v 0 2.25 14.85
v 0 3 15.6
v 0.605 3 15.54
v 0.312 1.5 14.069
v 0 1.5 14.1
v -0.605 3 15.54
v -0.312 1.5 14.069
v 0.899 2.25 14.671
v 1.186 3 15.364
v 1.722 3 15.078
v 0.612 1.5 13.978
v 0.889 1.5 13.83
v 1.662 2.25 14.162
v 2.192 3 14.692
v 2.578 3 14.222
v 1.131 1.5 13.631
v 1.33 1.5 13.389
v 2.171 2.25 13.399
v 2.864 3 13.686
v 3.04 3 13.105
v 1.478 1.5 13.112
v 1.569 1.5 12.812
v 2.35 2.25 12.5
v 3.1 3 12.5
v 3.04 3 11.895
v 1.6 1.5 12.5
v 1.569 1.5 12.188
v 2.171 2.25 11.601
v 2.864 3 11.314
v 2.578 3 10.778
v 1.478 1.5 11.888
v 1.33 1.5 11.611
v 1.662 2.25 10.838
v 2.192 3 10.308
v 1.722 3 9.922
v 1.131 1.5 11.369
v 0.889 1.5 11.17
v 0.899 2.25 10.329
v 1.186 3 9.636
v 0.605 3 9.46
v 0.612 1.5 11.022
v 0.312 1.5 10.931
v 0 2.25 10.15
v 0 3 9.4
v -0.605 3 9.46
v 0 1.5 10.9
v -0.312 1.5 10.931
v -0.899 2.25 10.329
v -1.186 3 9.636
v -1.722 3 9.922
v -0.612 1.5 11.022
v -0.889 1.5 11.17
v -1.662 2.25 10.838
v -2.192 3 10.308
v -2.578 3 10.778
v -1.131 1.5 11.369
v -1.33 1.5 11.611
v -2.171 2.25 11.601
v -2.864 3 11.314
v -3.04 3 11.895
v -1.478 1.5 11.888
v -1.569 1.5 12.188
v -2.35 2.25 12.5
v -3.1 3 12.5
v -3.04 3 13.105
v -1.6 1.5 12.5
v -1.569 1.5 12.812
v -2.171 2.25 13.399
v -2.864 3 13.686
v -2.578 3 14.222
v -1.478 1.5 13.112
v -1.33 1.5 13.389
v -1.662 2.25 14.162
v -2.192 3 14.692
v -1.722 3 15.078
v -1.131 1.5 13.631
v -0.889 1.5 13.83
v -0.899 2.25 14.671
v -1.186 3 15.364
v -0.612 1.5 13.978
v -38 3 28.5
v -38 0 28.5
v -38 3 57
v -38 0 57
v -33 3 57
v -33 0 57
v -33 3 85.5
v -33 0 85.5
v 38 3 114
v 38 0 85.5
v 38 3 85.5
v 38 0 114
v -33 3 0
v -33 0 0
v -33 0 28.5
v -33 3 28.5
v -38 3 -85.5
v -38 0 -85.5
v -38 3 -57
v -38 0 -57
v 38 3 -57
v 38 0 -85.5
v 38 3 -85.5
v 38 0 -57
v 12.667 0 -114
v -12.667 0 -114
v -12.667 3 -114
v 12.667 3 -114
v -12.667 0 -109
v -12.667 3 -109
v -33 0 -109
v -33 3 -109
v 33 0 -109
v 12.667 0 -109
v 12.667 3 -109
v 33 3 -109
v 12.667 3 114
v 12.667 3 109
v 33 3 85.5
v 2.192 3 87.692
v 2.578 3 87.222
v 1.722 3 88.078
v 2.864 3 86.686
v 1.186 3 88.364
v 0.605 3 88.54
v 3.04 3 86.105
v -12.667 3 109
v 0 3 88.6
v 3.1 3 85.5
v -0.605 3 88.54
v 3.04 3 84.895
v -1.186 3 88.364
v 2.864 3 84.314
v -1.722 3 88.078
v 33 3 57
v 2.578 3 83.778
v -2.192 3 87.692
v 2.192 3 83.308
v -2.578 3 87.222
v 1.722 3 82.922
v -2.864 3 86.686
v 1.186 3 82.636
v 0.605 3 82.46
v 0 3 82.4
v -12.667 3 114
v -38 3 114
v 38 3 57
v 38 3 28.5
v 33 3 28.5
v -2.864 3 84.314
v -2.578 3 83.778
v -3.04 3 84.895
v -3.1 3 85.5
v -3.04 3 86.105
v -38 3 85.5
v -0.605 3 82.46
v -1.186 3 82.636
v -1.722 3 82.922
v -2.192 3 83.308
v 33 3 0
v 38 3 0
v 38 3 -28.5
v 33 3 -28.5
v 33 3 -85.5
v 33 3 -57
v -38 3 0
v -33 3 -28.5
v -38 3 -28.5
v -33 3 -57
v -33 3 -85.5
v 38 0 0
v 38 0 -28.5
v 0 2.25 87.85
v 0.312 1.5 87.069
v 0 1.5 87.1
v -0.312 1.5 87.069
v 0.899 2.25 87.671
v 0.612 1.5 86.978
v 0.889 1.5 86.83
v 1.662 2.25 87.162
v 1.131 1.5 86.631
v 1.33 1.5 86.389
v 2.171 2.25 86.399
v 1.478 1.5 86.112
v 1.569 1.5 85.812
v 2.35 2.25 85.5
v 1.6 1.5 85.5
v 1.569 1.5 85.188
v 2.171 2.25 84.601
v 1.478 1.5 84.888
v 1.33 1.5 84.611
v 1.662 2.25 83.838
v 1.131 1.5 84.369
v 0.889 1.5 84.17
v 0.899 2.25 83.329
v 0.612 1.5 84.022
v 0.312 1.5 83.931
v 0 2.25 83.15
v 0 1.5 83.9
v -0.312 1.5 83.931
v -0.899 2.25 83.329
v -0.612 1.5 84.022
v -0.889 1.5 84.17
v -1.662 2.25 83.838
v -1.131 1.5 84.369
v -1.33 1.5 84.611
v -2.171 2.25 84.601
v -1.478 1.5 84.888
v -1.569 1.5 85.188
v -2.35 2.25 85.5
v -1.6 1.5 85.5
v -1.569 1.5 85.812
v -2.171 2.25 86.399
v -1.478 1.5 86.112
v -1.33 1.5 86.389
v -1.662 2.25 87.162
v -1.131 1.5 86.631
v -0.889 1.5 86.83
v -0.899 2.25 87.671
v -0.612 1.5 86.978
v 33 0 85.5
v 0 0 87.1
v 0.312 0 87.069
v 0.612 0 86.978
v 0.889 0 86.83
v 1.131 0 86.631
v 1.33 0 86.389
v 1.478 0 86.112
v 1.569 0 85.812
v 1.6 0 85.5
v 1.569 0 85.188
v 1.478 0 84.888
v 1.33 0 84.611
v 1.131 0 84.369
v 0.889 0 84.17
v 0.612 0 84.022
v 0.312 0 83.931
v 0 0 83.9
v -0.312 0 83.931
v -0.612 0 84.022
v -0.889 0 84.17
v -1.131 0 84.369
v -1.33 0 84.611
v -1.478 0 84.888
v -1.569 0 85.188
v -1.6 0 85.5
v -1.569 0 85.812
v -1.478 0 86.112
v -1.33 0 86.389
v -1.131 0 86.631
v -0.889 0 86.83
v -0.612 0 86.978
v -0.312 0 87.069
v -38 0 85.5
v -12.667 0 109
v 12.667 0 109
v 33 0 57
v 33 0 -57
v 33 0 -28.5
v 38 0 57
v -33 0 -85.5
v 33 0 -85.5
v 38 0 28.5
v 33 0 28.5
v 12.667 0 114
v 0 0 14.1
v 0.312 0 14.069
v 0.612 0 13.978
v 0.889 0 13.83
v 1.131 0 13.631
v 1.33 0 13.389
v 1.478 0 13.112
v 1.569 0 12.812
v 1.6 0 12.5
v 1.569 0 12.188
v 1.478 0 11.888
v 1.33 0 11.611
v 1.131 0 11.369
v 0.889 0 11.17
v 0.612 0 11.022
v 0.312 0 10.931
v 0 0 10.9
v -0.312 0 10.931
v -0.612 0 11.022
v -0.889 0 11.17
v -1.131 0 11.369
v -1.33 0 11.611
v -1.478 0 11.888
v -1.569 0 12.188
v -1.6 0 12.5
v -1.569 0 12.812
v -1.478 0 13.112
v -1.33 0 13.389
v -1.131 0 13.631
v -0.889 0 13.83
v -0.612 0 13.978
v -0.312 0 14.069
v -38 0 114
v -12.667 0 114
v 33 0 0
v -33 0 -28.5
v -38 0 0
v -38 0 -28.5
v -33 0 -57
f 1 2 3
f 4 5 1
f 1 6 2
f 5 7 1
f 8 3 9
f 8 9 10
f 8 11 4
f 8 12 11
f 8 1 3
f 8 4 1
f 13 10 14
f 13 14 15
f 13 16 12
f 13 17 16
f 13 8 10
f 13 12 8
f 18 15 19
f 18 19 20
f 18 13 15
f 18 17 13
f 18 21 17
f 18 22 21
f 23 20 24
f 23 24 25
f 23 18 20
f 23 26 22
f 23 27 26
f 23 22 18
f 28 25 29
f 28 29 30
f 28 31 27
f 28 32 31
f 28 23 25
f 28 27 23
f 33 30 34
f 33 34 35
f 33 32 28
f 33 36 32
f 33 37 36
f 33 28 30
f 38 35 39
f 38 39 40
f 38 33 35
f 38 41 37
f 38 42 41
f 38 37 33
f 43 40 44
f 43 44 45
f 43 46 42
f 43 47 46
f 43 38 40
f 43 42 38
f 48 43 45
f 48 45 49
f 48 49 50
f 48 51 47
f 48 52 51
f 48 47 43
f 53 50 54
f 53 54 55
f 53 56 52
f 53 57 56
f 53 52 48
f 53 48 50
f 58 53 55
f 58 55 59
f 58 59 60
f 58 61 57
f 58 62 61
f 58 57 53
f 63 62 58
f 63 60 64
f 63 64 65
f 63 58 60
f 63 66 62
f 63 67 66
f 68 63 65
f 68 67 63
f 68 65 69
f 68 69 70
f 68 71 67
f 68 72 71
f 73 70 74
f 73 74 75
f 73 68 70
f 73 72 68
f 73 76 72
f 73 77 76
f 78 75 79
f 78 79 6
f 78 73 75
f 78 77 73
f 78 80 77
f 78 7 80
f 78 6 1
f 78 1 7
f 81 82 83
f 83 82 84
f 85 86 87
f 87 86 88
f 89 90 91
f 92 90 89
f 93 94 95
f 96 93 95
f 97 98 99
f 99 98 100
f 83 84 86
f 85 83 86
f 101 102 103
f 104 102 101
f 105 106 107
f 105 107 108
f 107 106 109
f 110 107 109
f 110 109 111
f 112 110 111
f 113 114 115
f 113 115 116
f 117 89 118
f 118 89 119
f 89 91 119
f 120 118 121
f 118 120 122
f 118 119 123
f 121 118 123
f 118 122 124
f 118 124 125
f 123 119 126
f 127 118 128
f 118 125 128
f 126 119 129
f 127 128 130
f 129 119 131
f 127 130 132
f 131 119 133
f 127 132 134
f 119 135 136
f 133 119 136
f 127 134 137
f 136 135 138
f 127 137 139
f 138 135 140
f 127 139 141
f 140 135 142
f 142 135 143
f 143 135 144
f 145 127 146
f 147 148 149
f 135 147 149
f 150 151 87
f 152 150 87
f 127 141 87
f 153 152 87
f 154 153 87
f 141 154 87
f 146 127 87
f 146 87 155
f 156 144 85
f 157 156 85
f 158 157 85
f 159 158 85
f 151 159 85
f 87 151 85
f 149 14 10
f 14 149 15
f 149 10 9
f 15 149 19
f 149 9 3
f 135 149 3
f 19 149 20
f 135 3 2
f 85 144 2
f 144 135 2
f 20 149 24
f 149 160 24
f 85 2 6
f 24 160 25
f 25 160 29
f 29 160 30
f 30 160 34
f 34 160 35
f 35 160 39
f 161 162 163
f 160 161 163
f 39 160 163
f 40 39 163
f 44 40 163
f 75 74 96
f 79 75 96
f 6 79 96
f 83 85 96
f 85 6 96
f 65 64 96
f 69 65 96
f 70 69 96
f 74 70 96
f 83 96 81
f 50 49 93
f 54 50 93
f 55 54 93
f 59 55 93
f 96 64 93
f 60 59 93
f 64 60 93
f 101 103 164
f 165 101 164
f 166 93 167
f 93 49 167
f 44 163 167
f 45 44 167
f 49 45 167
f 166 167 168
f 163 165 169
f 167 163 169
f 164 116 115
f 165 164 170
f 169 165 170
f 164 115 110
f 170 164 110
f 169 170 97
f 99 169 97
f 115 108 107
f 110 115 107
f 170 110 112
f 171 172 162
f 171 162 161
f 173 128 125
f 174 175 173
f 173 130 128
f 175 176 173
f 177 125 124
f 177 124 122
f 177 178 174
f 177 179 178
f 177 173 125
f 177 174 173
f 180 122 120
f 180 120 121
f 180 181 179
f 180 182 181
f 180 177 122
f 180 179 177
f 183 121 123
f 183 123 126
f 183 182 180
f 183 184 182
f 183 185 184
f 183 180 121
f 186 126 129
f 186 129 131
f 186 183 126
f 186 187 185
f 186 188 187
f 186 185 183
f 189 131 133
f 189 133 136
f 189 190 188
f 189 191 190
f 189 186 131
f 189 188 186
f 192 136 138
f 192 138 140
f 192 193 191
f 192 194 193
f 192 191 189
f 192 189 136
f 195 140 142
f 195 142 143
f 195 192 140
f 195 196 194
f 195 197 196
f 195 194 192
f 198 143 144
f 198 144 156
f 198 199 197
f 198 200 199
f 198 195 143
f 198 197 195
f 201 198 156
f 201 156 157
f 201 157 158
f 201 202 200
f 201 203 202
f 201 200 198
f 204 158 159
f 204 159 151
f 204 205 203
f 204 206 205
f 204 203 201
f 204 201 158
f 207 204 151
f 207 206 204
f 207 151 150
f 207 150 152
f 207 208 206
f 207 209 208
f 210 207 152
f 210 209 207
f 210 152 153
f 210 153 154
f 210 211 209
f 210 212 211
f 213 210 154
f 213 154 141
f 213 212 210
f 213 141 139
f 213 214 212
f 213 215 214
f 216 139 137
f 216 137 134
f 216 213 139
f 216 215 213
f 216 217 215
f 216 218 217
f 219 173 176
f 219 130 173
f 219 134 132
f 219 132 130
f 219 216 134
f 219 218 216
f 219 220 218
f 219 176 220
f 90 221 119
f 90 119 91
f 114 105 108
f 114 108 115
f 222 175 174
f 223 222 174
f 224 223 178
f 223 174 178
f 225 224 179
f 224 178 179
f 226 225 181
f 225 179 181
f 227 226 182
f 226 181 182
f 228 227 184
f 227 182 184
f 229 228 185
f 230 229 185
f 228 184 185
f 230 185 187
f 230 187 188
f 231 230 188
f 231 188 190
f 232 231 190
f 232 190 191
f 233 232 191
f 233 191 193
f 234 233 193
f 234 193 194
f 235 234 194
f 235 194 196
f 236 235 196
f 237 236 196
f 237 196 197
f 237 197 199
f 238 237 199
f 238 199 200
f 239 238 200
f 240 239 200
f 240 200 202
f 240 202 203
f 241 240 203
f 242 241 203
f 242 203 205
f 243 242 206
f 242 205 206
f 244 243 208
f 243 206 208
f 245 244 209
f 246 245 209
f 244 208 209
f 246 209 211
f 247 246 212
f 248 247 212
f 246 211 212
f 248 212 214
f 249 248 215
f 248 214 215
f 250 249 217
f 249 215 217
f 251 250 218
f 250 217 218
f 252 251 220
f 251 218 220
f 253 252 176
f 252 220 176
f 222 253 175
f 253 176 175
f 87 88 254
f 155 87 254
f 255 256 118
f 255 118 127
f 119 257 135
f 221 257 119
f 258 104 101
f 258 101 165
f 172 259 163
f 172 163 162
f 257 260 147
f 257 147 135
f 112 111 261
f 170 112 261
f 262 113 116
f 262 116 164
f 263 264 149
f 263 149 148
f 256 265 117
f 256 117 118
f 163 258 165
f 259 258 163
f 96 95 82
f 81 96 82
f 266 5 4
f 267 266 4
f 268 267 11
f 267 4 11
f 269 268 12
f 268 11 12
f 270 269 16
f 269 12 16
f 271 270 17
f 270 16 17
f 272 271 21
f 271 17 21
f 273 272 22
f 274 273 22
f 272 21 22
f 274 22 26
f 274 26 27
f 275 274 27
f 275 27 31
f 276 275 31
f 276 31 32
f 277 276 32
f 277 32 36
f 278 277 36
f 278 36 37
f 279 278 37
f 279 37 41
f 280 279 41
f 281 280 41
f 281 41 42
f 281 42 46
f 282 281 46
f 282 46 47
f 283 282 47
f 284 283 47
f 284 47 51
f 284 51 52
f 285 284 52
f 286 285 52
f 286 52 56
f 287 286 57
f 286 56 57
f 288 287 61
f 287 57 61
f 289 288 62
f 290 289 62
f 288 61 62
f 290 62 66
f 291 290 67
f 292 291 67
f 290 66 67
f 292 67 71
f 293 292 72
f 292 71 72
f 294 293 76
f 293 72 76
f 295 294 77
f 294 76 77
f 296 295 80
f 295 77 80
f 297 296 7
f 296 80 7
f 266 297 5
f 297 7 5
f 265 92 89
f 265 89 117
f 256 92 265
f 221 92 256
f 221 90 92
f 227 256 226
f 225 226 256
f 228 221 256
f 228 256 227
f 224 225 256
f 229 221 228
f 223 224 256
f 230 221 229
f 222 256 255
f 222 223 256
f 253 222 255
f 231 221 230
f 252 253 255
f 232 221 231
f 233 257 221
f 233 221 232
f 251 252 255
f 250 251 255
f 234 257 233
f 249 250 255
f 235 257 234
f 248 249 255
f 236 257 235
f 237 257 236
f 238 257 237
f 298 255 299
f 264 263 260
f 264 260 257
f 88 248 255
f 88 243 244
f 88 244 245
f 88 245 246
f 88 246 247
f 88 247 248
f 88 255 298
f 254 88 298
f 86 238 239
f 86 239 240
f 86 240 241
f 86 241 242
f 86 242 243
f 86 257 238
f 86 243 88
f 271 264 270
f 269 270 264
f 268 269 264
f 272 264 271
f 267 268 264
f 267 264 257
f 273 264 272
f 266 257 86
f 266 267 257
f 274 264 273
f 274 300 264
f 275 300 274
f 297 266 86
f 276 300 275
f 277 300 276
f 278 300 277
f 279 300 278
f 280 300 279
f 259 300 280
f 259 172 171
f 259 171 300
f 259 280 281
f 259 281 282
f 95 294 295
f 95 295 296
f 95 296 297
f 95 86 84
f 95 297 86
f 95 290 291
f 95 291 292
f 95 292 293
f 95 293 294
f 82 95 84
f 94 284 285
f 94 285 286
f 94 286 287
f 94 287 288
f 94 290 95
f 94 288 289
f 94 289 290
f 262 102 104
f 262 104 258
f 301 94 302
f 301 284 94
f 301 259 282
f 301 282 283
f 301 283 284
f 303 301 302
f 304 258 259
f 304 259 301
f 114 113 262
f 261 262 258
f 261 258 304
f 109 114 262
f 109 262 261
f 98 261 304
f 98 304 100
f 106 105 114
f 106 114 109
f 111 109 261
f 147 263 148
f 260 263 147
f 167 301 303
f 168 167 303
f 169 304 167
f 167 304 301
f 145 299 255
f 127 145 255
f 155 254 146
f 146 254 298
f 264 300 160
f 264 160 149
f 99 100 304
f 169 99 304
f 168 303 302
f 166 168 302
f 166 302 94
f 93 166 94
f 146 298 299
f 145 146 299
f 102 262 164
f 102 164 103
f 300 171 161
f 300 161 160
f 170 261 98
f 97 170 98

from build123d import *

# Parameters (mm, degrees)
BOSS_EXTRUDE1_DEPTH = 3
SKETCH2_R           = 1.6
CUT_EXTRUDE1_DEPTH  = 121.203993278
CHAMFER1_SIZE       = 1.5


with BuildPart() as part:
    # Sketch1 → Boss-Extrude1 (new body)
    with BuildSketch(Plane(origin=(0, 0, 0), x_dir=(1, 0, 0), z_dir=(0, 1, 0))):
        Polygon((-38, -114), (-12.666666667, -114), (-12.666666667, -109), (0, -109), (0, 114), (-12.666666667, 114), (-12.666666667, 109), (-33, 109), (-33, 85.5), (-38, 85.5), (-38, 57), (-33, 57), (-33, 28.5), (-38, 28.5), (-38, 0), (-33, 0), (-33, -28.5), (-38, -28.5), (-38, -57), (-33, -57), (-33, -85.5), (-38, -85.5), align=None)
    boss_extrude1 = extrude(amount=BOSS_EXTRUDE1_DEPTH)

    # Mirror1: Boss-Extrude1 across plane
    add(boss_extrude1.mirror(Plane(origin=(0, 3, 109), x_dir=(0, 0, 1), z_dir=(-1, 0, 0))))

    # Sketch2 → Cut-Extrude1 (cut, through all)
    with BuildSketch(Plane(origin=(0, 3, 0), x_dir=(1, 0, 0), z_dir=(0, 1, 0))):
        with Locations(Location((0, -85.5, 0), (0, 0, 270))):
            Circle(SKETCH2_R)
        with Locations(Location((0, -12.5, 0), (0, 0, 270))):
            Circle(SKETCH2_R)
    extrude(amount=-CUT_EXTRUDE1_DEPTH, mode=Mode.SUBTRACT)

    # Chamfer1
    chamfer1_edges = [part.edges().sort_by_distance(p)[0] for p in [
        (0, 3, 83.9),
        (0, 3, 10.9),
    ]]
    chamfer(chamfer1_edges, length=CHAMFER1_SIZE)


solid = part.part
